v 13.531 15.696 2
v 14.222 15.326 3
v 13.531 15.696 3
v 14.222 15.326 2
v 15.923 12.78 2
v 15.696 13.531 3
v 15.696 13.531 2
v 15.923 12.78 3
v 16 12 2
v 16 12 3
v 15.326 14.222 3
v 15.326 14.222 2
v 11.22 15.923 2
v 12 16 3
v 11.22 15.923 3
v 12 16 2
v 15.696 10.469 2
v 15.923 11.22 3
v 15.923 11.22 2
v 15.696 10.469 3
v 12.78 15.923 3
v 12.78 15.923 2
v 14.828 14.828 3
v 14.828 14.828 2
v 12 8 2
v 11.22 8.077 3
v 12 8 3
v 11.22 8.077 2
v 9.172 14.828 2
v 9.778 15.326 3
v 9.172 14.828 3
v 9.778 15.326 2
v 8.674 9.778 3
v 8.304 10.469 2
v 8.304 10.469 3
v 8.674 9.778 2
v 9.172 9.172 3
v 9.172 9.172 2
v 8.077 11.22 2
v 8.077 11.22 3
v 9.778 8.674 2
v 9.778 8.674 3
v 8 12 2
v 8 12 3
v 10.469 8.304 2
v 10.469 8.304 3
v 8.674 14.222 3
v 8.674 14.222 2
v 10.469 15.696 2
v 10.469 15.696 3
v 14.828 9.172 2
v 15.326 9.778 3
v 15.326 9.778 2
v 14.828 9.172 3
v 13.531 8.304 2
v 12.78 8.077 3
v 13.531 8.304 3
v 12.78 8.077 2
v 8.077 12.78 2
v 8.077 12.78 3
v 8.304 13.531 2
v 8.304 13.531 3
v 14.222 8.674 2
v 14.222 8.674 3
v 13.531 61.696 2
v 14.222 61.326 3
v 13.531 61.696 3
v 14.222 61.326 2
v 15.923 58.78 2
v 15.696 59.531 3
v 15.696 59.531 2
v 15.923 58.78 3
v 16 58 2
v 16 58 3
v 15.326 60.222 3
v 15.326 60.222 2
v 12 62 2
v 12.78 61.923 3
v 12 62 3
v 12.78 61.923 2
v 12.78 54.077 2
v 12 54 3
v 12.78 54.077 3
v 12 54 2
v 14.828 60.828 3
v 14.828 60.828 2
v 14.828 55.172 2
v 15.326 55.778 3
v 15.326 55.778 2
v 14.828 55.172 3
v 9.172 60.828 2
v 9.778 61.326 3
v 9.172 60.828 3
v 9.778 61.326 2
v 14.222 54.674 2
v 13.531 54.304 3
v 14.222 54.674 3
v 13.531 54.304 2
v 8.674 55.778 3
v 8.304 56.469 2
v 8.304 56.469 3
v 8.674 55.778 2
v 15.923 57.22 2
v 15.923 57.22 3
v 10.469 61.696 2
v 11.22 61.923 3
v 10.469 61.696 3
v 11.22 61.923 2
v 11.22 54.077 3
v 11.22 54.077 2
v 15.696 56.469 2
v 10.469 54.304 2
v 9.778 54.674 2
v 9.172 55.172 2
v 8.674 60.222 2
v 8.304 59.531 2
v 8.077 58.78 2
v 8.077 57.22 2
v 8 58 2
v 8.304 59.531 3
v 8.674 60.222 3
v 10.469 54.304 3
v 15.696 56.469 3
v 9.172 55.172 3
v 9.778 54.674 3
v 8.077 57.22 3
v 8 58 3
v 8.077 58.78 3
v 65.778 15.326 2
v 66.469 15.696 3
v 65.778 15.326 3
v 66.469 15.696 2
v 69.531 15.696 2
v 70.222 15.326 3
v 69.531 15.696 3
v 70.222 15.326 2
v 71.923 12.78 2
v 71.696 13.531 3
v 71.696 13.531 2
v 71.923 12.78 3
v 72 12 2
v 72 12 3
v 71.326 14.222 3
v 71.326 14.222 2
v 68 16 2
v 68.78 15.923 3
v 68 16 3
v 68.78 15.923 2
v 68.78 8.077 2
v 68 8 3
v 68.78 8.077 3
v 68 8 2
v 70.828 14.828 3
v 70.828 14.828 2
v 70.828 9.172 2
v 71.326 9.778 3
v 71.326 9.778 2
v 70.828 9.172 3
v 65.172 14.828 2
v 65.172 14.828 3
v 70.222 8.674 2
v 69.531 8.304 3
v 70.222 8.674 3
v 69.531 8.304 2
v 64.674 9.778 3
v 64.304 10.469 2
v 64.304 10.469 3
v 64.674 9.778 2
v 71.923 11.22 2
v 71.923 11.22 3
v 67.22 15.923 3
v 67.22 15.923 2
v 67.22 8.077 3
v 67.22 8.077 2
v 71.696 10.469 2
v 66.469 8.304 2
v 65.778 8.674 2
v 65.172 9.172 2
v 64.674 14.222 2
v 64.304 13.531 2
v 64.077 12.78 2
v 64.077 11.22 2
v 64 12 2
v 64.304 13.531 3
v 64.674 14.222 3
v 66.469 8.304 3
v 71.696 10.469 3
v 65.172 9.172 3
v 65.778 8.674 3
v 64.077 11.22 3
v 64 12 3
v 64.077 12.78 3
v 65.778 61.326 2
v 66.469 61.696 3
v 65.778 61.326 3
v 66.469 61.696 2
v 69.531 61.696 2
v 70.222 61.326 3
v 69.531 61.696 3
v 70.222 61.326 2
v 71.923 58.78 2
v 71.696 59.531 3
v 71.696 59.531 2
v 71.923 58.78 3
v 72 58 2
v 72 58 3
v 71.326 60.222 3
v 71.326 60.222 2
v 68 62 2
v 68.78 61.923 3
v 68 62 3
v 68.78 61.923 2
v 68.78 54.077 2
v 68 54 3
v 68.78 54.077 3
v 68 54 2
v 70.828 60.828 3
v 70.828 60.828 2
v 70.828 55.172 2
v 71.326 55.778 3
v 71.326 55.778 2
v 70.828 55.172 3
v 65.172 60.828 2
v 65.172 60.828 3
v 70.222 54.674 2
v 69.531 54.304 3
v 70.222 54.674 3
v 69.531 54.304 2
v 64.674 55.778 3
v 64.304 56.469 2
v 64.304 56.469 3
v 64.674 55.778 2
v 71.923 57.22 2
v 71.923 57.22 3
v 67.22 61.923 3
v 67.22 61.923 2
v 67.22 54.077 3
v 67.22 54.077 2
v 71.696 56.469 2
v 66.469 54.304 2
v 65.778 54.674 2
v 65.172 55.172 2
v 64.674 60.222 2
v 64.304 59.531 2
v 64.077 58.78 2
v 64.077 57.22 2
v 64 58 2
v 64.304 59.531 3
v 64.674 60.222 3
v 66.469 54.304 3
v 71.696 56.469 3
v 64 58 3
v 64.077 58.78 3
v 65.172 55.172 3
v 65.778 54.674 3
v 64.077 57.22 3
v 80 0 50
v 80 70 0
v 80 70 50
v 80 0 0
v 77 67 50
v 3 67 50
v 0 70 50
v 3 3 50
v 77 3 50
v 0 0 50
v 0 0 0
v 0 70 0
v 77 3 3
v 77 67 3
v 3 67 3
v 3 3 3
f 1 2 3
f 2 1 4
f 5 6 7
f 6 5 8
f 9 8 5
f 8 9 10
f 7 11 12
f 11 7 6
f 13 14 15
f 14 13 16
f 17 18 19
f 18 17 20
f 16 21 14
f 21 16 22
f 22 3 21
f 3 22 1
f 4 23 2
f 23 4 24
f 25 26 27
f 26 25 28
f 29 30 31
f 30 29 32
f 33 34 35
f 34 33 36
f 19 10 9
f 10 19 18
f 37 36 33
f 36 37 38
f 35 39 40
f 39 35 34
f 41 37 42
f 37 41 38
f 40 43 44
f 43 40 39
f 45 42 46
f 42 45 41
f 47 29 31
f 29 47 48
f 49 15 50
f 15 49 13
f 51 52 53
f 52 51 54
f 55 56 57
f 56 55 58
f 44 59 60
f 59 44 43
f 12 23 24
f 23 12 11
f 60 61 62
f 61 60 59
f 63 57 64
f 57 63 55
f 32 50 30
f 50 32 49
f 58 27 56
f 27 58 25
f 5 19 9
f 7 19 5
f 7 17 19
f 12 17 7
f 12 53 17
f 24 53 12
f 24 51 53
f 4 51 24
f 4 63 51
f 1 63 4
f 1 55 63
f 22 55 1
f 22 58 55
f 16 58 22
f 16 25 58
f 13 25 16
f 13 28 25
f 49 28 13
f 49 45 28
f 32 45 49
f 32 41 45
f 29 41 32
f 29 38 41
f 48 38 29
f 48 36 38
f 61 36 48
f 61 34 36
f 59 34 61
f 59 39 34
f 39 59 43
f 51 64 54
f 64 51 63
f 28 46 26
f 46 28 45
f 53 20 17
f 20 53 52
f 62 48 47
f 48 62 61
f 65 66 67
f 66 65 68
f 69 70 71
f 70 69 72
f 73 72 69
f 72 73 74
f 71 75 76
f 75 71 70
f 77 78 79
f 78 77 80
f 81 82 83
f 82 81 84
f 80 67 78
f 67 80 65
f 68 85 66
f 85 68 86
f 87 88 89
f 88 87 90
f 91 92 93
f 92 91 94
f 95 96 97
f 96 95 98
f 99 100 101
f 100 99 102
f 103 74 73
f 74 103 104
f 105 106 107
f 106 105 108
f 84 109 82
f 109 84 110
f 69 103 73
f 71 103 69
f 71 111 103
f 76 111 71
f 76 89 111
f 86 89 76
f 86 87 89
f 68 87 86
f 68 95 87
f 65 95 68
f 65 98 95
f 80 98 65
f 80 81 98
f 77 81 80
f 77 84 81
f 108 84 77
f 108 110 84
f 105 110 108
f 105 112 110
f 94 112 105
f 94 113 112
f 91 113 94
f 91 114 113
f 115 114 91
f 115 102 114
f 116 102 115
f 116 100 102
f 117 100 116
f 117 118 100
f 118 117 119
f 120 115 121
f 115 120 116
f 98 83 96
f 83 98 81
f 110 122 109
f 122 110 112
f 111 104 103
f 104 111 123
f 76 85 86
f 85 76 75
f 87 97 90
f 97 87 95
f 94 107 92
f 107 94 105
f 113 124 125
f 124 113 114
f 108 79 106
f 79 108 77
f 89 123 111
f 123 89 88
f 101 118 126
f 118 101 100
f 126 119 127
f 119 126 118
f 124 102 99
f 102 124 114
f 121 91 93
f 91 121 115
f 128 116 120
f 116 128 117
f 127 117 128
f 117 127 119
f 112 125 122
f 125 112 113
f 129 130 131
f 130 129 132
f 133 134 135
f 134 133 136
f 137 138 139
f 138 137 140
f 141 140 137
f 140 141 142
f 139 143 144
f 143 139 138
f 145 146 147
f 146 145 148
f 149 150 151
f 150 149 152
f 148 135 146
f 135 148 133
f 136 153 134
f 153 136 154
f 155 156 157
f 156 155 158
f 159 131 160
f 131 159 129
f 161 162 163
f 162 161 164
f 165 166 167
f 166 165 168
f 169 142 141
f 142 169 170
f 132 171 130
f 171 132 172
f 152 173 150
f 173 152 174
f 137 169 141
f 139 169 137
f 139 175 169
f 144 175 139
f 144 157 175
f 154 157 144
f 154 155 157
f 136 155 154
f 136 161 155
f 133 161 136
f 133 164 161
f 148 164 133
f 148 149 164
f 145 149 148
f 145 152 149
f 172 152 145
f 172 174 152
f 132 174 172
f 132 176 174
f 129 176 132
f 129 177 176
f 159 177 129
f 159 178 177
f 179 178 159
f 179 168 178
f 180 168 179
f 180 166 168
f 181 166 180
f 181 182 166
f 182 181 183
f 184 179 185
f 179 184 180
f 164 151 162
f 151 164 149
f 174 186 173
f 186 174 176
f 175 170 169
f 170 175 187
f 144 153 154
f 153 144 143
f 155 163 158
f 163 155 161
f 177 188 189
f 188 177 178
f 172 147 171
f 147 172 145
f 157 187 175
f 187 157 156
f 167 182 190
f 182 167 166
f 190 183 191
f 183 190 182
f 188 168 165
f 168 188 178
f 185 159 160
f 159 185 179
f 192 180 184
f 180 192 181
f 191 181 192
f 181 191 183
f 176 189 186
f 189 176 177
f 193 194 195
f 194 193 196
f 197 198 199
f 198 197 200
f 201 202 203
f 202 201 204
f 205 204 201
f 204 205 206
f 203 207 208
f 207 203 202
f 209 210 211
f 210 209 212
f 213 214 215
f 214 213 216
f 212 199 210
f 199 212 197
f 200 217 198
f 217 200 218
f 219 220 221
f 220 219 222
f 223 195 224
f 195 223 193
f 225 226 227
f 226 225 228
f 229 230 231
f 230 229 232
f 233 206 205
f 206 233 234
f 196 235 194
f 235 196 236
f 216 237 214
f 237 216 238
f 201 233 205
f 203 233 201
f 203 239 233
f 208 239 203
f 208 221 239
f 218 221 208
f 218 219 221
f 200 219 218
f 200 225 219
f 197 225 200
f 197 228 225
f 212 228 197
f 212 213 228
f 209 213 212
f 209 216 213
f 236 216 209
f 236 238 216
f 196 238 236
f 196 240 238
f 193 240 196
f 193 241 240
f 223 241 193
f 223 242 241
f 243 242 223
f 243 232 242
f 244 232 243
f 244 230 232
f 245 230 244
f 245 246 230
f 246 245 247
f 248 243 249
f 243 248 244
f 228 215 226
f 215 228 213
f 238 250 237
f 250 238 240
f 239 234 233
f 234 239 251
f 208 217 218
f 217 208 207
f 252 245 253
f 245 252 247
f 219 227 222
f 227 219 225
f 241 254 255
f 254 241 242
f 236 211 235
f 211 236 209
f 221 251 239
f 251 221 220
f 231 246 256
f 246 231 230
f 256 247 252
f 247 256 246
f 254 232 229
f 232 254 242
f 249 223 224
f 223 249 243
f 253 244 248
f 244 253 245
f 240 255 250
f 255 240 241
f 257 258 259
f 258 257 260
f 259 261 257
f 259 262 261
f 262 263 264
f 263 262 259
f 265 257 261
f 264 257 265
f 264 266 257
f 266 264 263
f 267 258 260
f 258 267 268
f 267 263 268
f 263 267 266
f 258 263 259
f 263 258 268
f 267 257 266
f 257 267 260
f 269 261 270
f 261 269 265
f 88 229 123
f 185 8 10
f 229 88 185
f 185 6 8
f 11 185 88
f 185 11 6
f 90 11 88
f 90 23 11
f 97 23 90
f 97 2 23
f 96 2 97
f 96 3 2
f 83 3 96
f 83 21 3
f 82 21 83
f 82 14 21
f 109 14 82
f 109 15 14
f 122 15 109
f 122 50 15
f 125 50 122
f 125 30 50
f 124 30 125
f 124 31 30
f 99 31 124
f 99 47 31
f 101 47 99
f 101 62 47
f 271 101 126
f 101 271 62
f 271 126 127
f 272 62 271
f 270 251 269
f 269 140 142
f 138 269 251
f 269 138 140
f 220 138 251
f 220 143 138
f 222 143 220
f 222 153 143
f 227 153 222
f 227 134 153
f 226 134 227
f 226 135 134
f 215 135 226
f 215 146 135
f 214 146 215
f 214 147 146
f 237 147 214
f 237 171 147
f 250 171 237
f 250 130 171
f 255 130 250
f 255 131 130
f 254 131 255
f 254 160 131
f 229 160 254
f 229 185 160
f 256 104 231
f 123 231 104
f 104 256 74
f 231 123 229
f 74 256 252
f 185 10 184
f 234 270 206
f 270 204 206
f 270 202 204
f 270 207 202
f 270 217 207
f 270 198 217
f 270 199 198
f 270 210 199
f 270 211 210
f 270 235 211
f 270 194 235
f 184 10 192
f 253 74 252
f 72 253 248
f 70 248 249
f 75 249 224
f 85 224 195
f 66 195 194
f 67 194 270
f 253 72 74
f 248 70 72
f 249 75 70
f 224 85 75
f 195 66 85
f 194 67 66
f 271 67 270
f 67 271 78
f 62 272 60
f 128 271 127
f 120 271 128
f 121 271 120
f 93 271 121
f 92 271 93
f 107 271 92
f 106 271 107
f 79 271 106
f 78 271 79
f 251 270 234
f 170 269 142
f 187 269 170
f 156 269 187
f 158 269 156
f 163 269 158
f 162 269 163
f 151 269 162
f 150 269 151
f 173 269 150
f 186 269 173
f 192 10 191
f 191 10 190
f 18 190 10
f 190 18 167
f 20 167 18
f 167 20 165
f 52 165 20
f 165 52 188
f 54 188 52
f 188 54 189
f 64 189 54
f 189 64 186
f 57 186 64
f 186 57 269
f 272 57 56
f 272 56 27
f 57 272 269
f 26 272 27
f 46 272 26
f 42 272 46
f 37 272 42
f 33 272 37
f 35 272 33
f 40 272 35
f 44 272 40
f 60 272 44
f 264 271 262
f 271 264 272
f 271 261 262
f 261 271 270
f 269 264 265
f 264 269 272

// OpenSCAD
$fn = 32;

// ----------------------------------------------------------------------
// Enclosure box: bosses enclosure
// ----------------------------------------------------------------------

// --- parameters (mm) ---
box_l = 80;               // outer length, X
box_w = 70;               // outer width, Y
box_h = 50;               // outer height
wall_t = 3;               // wall thickness
boss_r = 4;               // corner boss radius
hole_r = 2;               // boss screw hole radius
boss_in = 12;             // boss inset from the corners
fit_tol = 0.1;            // tolerance for press fits, mm
free_tol = 0.3;           // tolerance for clearance fits, mm

inner_h = box_h - wall_t;  // cavity depth
boss_h = inner_h - 2;  // corner boss height

difference() {
  cube([box_l, box_w, box_h]);
  translate([wall_t, wall_t, wall_t])
    cube([box_l - 2 * wall_t, box_w - 2 * wall_t, box_h]);
  for (sx = [0, 1], sy = [0, 1])
    translate([sx ? box_l - boss_in : boss_in,
               sy ? box_w - boss_in : boss_in, wall_t - 1]) {
      cylinder(r = boss_r, h = boss_h);
      translate([0, 0, boss_h - 4])
        cylinder(r = hole_r, h = 5);
    }
}
